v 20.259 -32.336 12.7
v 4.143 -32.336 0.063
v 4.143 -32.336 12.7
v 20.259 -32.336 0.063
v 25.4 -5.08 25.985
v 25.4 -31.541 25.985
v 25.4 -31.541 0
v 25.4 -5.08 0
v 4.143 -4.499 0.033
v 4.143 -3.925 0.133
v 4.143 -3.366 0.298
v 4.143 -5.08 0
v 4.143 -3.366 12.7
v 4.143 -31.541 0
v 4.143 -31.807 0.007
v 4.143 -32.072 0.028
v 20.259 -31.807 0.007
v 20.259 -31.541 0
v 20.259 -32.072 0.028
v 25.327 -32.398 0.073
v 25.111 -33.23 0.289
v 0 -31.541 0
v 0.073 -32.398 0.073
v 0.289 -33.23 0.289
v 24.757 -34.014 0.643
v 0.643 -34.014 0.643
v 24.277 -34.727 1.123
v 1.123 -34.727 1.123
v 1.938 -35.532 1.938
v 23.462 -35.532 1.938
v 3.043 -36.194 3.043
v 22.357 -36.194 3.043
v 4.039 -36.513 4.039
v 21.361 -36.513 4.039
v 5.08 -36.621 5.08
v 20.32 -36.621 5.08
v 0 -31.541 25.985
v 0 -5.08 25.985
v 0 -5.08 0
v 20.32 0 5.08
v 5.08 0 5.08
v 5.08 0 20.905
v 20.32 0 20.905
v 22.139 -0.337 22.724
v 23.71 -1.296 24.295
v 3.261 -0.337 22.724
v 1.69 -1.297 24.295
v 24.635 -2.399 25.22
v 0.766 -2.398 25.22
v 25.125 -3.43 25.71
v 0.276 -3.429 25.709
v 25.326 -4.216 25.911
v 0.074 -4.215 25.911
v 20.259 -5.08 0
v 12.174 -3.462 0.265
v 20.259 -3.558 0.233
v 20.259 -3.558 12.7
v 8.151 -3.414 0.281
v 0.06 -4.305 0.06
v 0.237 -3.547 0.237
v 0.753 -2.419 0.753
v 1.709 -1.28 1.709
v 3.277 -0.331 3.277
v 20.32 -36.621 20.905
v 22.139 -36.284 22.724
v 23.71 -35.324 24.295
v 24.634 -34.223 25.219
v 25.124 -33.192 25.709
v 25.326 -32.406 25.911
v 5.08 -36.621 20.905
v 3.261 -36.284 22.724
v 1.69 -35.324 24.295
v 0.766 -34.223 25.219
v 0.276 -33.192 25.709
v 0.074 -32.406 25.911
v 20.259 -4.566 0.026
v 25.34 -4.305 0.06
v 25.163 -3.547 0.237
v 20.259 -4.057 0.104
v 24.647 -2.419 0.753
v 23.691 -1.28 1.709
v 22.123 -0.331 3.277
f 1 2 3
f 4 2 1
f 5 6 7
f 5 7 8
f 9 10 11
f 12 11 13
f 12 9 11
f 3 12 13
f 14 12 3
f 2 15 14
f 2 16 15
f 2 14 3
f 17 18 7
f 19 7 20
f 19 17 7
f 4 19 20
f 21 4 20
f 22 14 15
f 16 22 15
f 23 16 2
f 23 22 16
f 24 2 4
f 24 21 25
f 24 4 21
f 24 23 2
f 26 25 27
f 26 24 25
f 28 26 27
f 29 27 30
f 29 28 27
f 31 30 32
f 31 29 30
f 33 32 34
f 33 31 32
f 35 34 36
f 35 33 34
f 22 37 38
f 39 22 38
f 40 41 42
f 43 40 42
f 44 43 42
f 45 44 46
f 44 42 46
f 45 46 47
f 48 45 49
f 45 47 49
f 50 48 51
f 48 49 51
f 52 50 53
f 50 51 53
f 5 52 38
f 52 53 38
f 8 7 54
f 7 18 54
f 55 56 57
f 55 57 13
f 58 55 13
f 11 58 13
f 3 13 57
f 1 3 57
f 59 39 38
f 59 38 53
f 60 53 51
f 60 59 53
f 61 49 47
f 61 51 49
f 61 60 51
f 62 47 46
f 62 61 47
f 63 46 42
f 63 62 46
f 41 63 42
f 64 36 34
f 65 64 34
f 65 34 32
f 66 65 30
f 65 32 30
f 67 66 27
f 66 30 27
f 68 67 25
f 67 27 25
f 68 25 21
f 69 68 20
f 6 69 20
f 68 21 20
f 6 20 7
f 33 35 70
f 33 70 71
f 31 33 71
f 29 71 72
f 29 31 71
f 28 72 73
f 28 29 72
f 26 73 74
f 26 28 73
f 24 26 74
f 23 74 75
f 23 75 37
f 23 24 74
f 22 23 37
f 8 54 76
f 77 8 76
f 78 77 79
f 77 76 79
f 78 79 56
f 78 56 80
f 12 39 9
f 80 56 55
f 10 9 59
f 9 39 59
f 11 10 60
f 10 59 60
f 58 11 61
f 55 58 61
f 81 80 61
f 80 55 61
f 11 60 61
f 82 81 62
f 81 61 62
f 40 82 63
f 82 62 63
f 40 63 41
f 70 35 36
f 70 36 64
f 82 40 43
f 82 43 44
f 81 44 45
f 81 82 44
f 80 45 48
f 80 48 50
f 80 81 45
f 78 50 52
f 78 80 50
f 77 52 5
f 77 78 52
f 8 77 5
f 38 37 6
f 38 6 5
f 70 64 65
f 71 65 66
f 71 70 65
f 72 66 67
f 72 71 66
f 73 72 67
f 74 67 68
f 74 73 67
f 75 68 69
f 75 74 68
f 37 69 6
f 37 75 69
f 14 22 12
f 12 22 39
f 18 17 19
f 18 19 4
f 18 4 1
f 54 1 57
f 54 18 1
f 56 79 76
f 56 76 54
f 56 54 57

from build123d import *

# Parameters (mm, degrees)
F0_W        = 36.6208925843
F0_H        = 25.9851198643
F1_DEPTH    = 25.4
F3_DEPTH    = 12.7
F4_DEPTH    = 12.7
F5_T1_DEPTH = 50.8
F5_T3_DEPTH = 51.3851198643
F6_T1_DEPTH = 50.8
F6_T3_DEPTH = 51.3851198643


# Not quite as in the source:
# - a fillet or chamfer that OpenCascade refuses, or shapes differently, is made with other operations: its cross-section is extruded or revolved along the edge and cut away or added


with BuildPart() as f1:
    # F0 (on Right) → F1 (new body)
    with BuildSketch(Plane.YZ):
        with Locations((-18.3104462922, 12.9925599322)):
            Rectangle(F0_W, F0_H)
    extrude(amount=F1_DEPTH)

    # F2 (on Top) → F3 (join)
    with BuildSketch(Plane.XY):
        Polygon((20.2587246895, -3.5579784308), (4.1429102421, -3.3661234193), (4.1429102421, -32.3362164199), (20.2587246895, -32.3362164199), align=None)
    extrude(amount=F3_DEPTH)

    # F2 (on Top) → F4 (cut)
    with BuildSketch(Plane.XY):
        Polygon((20.2587246895, -3.5579784308), (4.1429102421, -3.3661234193), (4.1429102421, -32.3362164199), (20.2587246895, -32.3362164199), align=None)
    extrude(amount=F4_DEPTH, mode=Mode.SUBTRACT)

    # F5: fillet of radius 5.08 on 4 edges, made by hand

    # F5_s2 → F5_t1 (cut)
    with BuildSketch(Plane.YZ.offset(-12.7)):
        with BuildLine():
            ThreePointArc((-36.6208925843, 20.9051198643), (-35.1329950328, 24.4972223128), (-31.5408925843, 25.9851198643))
            Line((-31.5408925843, 25.9851198643), (-36.6208925843, 25.9851198643))
            Line((-36.6208925843, 25.9851198643), (-36.6208925843, 20.9051198643))
        make_face()
        with BuildLine():
            ThreePointArc((-31.5408925843, 0), (-35.1329950328, 1.4878975516), (-36.6208925843, 5.08))
            Line((-36.6208925843, 5.08), (-36.6208925843, 0))
            Line((-36.6208925843, 0), (-31.5408925843, 0))
        make_face()
    extrude(amount=F5_T1_DEPTH, mode=Mode.SUBTRACT)

    # F5_s4 → F5_t3 (cut)
    with BuildSketch(Plane.XY.offset(-12.7)):
        with BuildLine():
            ThreePointArc((5.08, -36.6208925843), (1.4878975516, -35.1329950328), (0, -31.5408925843))
            Line((0, -31.5408925843), (0, -36.6208925843))
            Line((0, -36.6208925843), (5.08, -36.6208925843))
        make_face()
        with BuildLine():
            ThreePointArc((20.32, -36.6208925843), (23.9121024484, -35.1329950328), (25.4, -31.5408925843))
            Line((25.4, -31.5408925843), (25.4, -36.6208925843))
            Line((25.4, -36.6208925843), (20.32, -36.6208925843))
        make_face()
    extrude(amount=F5_T3_DEPTH, mode=Mode.SUBTRACT)

    # F6: fillet of radius 5.08 on 4 edges, made by hand

    # F6_s2 → F6_t1 (cut)
    with BuildSketch(Plane.YZ.offset(-12.7)):
        with BuildLine():
            ThreePointArc((-5.08, 0), (-1.4878975516, 1.4878975516), (0, 5.08))
            Line((0, 5.08), (0, 0))
            Line((0, 0), (-5.08, 0))
        make_face()
        with BuildLine():
            ThreePointArc((0, 20.9051198643), (-1.4878975516, 24.4972223128), (-5.08, 25.9851198643))
            Line((-5.08, 25.9851198643), (0, 25.9851198643))
            Line((0, 25.9851198643), (0, 20.9051198643))
        make_face()
    extrude(amount=F6_T1_DEPTH, mode=Mode.SUBTRACT)

    # F6_s4 → F6_t3 (cut)
    with BuildSketch(Plane.XY.offset(-12.7)):
        with BuildLine():
            ThreePointArc((0, -5.08), (1.4878975516, -1.4878975516), (5.08, 0))
            Line((5.08, 0), (0, 0))
            Line((0, 0), (0, -5.08))
        make_face()
        with BuildLine():
            ThreePointArc((20.32, 0), (23.9121024484, -1.4878975516), (25.4, -5.08))
            Line((25.4, -5.08), (25.4, 0))
            Line((25.4, 0), (20.32, 0))
        make_face()
    extrude(amount=F6_T3_DEPTH, mode=Mode.SUBTRACT)


solid = f1.part
